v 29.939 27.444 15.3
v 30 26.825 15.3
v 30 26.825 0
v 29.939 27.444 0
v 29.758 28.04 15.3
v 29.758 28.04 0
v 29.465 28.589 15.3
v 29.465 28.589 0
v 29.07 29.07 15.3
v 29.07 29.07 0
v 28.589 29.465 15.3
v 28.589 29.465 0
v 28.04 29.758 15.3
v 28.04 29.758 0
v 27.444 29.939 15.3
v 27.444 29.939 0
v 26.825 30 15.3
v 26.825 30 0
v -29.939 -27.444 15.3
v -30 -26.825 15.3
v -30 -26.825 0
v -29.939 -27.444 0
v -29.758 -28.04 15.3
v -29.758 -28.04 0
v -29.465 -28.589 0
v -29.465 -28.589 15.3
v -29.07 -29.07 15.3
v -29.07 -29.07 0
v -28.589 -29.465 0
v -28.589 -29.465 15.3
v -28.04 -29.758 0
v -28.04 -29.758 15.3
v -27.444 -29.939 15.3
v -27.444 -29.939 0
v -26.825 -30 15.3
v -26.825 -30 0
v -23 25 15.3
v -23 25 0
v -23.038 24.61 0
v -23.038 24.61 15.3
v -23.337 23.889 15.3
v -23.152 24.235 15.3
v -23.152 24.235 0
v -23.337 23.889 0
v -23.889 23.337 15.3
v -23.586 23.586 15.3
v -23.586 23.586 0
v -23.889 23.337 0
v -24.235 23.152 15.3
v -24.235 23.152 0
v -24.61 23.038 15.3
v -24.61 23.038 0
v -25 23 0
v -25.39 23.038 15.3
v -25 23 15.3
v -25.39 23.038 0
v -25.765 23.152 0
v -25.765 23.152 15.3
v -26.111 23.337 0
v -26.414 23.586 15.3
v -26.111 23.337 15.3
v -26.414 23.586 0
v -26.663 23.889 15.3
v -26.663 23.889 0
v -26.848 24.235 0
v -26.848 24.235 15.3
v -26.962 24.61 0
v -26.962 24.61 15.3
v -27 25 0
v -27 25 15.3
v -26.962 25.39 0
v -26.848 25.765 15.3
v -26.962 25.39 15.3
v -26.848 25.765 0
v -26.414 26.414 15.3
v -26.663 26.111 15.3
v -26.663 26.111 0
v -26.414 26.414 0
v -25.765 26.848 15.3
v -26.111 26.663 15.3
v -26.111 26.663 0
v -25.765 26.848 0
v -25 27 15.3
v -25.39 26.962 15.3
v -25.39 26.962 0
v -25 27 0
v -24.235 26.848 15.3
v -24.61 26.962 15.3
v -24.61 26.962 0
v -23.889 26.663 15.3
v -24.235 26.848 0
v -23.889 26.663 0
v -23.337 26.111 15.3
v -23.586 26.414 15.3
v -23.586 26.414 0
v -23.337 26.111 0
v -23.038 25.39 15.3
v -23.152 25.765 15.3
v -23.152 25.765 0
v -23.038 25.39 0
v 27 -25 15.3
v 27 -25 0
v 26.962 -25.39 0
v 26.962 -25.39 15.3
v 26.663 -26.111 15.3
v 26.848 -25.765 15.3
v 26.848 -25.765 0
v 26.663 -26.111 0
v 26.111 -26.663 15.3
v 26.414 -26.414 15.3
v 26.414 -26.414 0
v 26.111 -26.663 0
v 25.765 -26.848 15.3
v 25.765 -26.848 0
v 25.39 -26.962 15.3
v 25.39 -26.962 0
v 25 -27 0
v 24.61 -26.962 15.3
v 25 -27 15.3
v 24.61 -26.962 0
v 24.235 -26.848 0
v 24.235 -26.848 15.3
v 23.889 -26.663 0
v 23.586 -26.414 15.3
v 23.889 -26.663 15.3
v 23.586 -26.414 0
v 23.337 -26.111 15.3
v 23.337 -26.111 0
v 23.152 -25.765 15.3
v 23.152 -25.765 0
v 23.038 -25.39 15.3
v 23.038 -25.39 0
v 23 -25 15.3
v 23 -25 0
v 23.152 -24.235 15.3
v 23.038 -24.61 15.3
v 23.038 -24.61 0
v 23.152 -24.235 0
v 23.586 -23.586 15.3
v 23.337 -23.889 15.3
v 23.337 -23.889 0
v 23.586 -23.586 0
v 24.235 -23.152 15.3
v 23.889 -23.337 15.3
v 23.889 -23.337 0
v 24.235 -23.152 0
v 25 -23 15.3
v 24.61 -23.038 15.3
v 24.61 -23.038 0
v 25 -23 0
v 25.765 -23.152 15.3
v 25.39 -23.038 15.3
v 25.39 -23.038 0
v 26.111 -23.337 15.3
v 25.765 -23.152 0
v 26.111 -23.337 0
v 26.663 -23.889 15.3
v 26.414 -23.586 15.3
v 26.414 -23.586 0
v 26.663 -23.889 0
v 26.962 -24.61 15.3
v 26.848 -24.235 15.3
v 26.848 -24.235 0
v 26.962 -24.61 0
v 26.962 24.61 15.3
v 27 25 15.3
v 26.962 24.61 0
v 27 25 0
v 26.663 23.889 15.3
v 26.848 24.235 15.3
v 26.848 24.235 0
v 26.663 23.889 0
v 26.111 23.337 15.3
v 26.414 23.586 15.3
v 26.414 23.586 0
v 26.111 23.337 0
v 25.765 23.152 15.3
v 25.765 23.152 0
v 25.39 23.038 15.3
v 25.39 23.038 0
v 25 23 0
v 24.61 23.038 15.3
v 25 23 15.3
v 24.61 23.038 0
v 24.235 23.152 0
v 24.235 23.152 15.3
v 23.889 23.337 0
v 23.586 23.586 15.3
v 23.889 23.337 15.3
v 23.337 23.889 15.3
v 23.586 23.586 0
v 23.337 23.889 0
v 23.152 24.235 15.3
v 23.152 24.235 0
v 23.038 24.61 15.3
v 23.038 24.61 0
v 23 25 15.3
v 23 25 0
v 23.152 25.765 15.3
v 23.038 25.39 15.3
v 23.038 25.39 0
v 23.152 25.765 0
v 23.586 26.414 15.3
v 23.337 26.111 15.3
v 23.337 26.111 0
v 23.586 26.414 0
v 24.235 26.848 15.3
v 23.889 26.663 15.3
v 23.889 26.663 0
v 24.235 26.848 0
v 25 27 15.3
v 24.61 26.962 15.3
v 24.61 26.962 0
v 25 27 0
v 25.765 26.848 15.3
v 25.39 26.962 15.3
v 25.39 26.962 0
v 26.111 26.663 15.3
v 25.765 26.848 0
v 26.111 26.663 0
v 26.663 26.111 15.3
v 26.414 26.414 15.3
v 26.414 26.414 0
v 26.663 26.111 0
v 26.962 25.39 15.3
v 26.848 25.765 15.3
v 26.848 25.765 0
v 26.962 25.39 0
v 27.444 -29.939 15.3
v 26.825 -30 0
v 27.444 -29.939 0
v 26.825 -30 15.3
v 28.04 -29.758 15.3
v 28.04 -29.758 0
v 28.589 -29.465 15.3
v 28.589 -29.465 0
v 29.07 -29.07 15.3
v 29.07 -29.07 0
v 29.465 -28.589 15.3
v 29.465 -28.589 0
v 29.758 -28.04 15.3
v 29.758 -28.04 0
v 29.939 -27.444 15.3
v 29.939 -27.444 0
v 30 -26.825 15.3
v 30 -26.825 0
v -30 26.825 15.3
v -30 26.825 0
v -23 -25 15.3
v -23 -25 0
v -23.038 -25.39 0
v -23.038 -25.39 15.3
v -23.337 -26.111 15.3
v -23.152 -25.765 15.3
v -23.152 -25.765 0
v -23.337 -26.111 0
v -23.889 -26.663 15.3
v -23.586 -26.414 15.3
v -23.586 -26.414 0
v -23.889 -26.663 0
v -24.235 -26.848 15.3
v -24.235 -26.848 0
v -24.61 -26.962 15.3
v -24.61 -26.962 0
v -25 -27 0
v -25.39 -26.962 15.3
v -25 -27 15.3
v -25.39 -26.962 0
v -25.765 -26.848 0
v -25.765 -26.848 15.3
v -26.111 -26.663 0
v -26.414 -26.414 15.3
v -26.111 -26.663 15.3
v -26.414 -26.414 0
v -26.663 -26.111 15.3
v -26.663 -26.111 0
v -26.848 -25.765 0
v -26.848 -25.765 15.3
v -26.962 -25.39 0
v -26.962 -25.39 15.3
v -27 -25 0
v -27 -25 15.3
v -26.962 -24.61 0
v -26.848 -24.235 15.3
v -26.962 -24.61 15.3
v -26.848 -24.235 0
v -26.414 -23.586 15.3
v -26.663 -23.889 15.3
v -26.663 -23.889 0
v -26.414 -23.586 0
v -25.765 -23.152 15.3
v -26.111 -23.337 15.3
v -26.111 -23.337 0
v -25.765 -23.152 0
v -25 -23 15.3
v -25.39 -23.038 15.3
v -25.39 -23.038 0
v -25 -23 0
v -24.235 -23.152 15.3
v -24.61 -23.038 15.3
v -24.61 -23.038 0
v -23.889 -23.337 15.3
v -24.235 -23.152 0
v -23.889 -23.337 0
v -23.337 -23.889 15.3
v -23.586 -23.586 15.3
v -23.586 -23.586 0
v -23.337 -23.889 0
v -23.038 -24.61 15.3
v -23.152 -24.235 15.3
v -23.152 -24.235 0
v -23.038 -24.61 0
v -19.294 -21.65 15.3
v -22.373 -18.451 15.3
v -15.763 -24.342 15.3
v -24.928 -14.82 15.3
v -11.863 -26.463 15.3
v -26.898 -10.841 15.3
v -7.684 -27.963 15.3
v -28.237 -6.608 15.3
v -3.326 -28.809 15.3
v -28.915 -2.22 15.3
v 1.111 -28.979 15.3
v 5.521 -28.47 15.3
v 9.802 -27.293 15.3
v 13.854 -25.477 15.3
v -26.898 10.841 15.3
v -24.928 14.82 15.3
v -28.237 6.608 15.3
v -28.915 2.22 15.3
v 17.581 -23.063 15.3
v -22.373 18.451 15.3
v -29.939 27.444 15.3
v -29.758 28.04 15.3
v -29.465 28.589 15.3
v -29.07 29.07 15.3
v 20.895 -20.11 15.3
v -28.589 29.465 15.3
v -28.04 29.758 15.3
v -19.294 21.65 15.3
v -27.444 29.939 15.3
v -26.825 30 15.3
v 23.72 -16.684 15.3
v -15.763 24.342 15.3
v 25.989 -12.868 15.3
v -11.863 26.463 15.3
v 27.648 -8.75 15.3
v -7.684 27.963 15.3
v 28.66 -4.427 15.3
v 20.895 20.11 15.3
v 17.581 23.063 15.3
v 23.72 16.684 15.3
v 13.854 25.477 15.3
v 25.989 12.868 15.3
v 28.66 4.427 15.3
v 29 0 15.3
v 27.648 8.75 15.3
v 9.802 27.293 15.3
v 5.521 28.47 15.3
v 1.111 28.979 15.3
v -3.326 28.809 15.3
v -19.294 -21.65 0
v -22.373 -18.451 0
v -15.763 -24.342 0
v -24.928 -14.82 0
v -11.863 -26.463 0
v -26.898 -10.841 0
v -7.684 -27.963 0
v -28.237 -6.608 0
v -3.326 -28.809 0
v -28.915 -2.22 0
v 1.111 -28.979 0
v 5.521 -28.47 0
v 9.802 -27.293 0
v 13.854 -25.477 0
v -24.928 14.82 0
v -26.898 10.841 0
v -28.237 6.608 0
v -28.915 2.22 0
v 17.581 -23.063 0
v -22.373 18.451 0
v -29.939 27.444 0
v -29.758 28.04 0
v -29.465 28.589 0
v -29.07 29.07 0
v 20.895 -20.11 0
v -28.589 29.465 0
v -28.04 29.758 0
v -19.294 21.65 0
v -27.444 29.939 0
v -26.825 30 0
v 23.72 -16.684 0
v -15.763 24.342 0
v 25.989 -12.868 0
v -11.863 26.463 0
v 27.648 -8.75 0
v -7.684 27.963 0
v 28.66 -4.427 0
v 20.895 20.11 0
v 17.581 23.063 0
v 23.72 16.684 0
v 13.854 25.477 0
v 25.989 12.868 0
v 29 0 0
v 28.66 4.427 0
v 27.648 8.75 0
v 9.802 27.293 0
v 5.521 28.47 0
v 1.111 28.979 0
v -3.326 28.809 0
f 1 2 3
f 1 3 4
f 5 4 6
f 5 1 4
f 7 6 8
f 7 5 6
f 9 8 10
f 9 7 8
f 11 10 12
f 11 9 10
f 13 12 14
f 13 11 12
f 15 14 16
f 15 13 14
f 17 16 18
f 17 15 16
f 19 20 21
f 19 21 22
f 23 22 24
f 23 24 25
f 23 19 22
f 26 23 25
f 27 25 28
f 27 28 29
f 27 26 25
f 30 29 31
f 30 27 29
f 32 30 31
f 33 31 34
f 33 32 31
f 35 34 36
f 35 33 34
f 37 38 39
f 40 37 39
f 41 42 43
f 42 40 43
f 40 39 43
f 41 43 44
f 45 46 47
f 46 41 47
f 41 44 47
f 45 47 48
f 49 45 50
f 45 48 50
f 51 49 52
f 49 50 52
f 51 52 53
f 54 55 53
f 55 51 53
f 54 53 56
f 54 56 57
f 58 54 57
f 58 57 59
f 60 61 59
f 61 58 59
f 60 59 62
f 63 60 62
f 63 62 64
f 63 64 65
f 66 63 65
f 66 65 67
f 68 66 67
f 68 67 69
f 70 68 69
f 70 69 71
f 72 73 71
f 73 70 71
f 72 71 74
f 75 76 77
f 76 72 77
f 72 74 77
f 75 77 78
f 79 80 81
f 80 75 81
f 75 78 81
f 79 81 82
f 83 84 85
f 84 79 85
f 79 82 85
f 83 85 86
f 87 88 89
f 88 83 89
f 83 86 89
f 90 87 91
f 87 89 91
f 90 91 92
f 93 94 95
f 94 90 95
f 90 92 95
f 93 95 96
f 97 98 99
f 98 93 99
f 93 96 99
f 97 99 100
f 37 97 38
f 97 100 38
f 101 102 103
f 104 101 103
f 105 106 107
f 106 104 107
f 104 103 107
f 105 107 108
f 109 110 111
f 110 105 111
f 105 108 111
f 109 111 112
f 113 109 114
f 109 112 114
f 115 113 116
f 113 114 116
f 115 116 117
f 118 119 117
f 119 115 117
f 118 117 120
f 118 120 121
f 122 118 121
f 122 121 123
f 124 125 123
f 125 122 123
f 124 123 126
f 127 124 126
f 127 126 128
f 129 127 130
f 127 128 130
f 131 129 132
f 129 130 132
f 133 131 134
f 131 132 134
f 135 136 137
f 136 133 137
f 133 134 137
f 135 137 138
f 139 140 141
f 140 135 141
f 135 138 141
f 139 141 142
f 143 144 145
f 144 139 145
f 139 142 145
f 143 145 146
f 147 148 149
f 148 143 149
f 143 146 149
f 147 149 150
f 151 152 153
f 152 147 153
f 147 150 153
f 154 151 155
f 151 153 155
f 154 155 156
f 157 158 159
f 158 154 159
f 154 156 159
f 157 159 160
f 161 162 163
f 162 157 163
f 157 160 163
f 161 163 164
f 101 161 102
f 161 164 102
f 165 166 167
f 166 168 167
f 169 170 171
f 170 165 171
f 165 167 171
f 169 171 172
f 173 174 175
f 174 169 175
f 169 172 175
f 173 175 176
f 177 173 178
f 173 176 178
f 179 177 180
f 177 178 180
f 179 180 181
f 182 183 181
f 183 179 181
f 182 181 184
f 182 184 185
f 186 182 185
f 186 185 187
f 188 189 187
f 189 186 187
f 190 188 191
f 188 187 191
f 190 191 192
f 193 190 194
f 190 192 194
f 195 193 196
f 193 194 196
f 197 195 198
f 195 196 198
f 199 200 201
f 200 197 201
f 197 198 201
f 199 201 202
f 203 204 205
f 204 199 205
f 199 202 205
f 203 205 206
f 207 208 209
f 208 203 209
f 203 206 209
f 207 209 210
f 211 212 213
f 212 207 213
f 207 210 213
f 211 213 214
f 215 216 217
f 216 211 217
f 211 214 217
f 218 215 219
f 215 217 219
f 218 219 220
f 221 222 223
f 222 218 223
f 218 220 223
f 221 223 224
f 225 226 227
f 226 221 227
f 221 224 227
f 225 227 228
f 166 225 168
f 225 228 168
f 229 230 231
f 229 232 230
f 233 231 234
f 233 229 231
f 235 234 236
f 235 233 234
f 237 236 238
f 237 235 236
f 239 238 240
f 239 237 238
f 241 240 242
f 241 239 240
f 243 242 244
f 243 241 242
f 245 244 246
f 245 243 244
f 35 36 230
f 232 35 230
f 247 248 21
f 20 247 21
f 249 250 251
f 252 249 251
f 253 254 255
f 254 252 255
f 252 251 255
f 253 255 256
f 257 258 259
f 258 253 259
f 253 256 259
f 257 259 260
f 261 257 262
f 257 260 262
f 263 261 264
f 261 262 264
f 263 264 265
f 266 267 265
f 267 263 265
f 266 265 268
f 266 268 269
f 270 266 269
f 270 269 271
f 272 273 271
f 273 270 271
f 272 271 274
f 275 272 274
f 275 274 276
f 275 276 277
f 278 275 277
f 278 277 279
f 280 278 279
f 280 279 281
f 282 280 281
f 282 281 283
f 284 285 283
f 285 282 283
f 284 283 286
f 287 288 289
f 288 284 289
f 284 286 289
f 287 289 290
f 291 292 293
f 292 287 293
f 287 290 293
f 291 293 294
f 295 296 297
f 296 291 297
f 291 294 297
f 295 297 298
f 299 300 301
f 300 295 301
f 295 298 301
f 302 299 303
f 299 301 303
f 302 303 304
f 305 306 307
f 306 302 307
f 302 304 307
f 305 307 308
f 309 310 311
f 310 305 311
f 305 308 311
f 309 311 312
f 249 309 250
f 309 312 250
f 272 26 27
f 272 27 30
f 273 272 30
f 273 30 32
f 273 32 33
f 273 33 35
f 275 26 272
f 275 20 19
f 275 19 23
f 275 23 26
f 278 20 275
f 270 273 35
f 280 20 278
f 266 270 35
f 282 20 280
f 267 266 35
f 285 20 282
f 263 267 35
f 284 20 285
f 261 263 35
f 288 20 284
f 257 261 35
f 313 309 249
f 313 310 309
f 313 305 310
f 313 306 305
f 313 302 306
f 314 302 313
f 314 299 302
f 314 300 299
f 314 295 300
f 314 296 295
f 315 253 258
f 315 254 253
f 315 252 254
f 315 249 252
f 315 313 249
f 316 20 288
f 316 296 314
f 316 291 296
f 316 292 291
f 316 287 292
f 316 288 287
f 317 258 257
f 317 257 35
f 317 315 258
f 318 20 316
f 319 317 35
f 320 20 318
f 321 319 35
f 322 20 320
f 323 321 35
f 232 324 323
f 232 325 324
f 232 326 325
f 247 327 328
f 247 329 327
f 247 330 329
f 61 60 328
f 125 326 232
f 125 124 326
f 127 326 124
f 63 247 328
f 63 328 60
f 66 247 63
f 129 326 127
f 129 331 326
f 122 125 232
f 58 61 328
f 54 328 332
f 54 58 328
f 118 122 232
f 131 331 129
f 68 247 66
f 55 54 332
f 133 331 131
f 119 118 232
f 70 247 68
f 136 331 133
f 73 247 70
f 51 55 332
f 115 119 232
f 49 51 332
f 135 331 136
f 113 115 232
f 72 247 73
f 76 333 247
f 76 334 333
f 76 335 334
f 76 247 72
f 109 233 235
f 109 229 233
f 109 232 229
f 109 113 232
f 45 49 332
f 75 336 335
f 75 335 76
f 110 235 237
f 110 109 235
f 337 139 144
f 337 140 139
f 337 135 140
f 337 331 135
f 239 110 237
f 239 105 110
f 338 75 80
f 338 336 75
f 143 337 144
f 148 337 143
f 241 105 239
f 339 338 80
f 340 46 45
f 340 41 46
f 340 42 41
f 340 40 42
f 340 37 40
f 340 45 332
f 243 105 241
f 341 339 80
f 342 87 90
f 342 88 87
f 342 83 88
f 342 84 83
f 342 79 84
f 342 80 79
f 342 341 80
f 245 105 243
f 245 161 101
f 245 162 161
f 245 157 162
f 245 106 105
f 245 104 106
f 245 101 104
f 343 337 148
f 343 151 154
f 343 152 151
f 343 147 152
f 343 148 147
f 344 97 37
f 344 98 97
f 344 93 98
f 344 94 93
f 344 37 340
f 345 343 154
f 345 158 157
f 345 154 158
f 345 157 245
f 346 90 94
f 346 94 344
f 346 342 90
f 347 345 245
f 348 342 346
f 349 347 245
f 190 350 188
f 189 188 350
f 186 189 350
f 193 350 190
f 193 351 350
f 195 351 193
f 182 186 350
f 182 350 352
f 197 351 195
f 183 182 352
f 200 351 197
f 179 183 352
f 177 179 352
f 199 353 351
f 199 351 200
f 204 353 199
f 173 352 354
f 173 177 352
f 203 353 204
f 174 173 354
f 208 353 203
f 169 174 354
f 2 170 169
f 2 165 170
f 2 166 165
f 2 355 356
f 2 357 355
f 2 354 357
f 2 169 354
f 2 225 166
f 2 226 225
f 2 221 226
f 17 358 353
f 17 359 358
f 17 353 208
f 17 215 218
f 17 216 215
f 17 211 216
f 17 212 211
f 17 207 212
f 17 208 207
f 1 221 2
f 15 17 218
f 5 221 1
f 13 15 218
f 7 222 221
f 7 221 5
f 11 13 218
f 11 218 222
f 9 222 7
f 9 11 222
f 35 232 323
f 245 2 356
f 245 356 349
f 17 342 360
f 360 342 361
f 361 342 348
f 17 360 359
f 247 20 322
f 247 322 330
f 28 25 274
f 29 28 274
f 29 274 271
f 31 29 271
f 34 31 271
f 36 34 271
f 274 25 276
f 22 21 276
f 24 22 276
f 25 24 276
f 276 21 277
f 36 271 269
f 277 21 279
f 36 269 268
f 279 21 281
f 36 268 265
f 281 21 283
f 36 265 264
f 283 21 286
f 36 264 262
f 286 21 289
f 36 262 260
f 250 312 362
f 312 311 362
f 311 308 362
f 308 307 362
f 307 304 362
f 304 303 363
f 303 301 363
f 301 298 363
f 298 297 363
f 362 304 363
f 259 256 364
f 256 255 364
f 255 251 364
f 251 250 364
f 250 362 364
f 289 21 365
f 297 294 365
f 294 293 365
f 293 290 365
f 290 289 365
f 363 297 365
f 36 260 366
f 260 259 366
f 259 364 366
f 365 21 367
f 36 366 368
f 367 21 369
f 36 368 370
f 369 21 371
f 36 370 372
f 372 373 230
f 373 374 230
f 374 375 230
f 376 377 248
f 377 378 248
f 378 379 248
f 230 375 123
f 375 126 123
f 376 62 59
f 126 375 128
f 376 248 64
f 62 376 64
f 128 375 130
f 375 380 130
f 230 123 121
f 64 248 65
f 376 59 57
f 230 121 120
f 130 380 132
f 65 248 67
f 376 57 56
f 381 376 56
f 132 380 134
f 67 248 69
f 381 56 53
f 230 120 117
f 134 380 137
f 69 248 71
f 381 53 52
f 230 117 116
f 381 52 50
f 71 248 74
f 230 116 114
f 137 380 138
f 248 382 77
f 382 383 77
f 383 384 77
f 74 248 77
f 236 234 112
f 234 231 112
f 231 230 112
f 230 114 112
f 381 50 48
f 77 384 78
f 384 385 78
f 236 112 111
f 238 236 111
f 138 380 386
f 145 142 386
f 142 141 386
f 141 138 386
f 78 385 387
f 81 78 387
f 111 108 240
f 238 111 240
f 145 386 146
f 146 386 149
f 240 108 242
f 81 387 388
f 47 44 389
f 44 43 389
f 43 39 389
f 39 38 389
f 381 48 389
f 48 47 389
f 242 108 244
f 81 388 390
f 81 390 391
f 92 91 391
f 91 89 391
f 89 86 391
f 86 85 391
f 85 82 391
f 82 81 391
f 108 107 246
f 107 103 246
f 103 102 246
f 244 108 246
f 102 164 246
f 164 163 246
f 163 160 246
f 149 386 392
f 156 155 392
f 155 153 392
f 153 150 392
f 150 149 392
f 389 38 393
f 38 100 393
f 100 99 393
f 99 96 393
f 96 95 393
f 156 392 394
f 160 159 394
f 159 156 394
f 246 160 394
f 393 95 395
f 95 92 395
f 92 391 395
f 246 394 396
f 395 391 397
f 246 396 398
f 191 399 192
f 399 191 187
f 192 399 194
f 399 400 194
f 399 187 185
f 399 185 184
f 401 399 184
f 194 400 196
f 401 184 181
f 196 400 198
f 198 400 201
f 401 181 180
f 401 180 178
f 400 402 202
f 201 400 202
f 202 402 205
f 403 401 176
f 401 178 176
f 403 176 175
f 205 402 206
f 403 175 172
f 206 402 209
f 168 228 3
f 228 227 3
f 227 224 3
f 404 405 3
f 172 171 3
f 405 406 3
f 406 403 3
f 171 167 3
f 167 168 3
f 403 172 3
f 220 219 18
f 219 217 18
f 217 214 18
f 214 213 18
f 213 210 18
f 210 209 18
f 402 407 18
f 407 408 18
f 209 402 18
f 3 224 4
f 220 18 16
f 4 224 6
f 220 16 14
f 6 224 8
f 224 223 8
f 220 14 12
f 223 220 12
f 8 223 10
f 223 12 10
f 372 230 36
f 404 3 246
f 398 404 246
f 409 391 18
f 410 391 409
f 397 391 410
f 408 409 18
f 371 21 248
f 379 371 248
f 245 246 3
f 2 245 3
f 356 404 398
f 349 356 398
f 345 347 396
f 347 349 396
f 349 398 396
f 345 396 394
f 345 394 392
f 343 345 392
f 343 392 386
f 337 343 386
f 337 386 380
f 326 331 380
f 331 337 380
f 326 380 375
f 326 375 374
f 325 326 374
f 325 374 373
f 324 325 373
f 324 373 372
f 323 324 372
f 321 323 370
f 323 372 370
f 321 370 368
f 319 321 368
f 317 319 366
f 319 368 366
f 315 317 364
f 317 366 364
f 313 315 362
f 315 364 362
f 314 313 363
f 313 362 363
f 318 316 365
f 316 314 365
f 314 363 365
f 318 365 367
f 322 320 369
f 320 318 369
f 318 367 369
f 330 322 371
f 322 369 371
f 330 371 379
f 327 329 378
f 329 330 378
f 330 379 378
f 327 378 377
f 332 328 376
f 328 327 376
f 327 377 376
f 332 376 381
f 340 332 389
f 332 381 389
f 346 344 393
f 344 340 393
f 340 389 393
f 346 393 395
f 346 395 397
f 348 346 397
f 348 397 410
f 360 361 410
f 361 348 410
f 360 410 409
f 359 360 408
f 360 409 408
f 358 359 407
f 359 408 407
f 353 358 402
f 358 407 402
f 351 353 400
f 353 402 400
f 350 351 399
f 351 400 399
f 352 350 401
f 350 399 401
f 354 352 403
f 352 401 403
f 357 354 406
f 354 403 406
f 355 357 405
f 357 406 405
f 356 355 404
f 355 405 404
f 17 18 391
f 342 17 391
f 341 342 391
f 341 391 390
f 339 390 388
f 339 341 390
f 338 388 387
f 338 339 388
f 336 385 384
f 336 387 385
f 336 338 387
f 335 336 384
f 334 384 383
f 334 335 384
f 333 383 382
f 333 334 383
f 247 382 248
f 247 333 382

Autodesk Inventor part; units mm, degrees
ref_plane "YZ Plane" through (0, 0, 0) normal (1, 0, 0) x (0, 1, 0)
ref_plane "XZ Plane" through (0, 0, 0) normal (0, 1, 0) x (-1, 0, 0)
ref_plane "XY Plane" through (0, 0, 0) normal (0, 0, 1) x (1, 0, 0)
sketch "Sketch1" plane through (0, 0, 0) normal (0, 0, 1) x (1, 0, 0)
  line L0 (-30, -30) -> (30, -30)
  line L1 (30, -30) -> (30, 30)
  line L2 (30, 30) -> (-30, 30)
  line L3 (-30, 30) -> (-30, -30)
  line L4 (-30, -30) -> (30, 30) construction
  line L5 (30, -30) -> (-30, 30) construction
  circle A0 centre (0, 0) radius 29
  circle A1 centre (-25, 25) radius 2
  circle A2 centre (25, 25) radius 2
  circle A3 centre (25, -25) radius 2
  circle A4 centre (-25, -25) radius 2
  line L6 (-25, 25) -> (25, 25) construction
  line L7 (25, 25) -> (25, -25) construction
  line L8 (25, -25) -> (-25, -25) construction
  dimension "d0" = 60
  dimension "d3" = 50
  dimension "d4" = 4
  dimension "d5" = 58
extrude "Extrusion1" add sketch "Sketch1" along normal blind 15.3
fillet "Fillet1" radius 3.175 4 edges at (30, 30, 7.65) (30, -30, 7.65) (-30, 30, 7.65) (-30, -30, 7.65)
properties part number "Fan"
